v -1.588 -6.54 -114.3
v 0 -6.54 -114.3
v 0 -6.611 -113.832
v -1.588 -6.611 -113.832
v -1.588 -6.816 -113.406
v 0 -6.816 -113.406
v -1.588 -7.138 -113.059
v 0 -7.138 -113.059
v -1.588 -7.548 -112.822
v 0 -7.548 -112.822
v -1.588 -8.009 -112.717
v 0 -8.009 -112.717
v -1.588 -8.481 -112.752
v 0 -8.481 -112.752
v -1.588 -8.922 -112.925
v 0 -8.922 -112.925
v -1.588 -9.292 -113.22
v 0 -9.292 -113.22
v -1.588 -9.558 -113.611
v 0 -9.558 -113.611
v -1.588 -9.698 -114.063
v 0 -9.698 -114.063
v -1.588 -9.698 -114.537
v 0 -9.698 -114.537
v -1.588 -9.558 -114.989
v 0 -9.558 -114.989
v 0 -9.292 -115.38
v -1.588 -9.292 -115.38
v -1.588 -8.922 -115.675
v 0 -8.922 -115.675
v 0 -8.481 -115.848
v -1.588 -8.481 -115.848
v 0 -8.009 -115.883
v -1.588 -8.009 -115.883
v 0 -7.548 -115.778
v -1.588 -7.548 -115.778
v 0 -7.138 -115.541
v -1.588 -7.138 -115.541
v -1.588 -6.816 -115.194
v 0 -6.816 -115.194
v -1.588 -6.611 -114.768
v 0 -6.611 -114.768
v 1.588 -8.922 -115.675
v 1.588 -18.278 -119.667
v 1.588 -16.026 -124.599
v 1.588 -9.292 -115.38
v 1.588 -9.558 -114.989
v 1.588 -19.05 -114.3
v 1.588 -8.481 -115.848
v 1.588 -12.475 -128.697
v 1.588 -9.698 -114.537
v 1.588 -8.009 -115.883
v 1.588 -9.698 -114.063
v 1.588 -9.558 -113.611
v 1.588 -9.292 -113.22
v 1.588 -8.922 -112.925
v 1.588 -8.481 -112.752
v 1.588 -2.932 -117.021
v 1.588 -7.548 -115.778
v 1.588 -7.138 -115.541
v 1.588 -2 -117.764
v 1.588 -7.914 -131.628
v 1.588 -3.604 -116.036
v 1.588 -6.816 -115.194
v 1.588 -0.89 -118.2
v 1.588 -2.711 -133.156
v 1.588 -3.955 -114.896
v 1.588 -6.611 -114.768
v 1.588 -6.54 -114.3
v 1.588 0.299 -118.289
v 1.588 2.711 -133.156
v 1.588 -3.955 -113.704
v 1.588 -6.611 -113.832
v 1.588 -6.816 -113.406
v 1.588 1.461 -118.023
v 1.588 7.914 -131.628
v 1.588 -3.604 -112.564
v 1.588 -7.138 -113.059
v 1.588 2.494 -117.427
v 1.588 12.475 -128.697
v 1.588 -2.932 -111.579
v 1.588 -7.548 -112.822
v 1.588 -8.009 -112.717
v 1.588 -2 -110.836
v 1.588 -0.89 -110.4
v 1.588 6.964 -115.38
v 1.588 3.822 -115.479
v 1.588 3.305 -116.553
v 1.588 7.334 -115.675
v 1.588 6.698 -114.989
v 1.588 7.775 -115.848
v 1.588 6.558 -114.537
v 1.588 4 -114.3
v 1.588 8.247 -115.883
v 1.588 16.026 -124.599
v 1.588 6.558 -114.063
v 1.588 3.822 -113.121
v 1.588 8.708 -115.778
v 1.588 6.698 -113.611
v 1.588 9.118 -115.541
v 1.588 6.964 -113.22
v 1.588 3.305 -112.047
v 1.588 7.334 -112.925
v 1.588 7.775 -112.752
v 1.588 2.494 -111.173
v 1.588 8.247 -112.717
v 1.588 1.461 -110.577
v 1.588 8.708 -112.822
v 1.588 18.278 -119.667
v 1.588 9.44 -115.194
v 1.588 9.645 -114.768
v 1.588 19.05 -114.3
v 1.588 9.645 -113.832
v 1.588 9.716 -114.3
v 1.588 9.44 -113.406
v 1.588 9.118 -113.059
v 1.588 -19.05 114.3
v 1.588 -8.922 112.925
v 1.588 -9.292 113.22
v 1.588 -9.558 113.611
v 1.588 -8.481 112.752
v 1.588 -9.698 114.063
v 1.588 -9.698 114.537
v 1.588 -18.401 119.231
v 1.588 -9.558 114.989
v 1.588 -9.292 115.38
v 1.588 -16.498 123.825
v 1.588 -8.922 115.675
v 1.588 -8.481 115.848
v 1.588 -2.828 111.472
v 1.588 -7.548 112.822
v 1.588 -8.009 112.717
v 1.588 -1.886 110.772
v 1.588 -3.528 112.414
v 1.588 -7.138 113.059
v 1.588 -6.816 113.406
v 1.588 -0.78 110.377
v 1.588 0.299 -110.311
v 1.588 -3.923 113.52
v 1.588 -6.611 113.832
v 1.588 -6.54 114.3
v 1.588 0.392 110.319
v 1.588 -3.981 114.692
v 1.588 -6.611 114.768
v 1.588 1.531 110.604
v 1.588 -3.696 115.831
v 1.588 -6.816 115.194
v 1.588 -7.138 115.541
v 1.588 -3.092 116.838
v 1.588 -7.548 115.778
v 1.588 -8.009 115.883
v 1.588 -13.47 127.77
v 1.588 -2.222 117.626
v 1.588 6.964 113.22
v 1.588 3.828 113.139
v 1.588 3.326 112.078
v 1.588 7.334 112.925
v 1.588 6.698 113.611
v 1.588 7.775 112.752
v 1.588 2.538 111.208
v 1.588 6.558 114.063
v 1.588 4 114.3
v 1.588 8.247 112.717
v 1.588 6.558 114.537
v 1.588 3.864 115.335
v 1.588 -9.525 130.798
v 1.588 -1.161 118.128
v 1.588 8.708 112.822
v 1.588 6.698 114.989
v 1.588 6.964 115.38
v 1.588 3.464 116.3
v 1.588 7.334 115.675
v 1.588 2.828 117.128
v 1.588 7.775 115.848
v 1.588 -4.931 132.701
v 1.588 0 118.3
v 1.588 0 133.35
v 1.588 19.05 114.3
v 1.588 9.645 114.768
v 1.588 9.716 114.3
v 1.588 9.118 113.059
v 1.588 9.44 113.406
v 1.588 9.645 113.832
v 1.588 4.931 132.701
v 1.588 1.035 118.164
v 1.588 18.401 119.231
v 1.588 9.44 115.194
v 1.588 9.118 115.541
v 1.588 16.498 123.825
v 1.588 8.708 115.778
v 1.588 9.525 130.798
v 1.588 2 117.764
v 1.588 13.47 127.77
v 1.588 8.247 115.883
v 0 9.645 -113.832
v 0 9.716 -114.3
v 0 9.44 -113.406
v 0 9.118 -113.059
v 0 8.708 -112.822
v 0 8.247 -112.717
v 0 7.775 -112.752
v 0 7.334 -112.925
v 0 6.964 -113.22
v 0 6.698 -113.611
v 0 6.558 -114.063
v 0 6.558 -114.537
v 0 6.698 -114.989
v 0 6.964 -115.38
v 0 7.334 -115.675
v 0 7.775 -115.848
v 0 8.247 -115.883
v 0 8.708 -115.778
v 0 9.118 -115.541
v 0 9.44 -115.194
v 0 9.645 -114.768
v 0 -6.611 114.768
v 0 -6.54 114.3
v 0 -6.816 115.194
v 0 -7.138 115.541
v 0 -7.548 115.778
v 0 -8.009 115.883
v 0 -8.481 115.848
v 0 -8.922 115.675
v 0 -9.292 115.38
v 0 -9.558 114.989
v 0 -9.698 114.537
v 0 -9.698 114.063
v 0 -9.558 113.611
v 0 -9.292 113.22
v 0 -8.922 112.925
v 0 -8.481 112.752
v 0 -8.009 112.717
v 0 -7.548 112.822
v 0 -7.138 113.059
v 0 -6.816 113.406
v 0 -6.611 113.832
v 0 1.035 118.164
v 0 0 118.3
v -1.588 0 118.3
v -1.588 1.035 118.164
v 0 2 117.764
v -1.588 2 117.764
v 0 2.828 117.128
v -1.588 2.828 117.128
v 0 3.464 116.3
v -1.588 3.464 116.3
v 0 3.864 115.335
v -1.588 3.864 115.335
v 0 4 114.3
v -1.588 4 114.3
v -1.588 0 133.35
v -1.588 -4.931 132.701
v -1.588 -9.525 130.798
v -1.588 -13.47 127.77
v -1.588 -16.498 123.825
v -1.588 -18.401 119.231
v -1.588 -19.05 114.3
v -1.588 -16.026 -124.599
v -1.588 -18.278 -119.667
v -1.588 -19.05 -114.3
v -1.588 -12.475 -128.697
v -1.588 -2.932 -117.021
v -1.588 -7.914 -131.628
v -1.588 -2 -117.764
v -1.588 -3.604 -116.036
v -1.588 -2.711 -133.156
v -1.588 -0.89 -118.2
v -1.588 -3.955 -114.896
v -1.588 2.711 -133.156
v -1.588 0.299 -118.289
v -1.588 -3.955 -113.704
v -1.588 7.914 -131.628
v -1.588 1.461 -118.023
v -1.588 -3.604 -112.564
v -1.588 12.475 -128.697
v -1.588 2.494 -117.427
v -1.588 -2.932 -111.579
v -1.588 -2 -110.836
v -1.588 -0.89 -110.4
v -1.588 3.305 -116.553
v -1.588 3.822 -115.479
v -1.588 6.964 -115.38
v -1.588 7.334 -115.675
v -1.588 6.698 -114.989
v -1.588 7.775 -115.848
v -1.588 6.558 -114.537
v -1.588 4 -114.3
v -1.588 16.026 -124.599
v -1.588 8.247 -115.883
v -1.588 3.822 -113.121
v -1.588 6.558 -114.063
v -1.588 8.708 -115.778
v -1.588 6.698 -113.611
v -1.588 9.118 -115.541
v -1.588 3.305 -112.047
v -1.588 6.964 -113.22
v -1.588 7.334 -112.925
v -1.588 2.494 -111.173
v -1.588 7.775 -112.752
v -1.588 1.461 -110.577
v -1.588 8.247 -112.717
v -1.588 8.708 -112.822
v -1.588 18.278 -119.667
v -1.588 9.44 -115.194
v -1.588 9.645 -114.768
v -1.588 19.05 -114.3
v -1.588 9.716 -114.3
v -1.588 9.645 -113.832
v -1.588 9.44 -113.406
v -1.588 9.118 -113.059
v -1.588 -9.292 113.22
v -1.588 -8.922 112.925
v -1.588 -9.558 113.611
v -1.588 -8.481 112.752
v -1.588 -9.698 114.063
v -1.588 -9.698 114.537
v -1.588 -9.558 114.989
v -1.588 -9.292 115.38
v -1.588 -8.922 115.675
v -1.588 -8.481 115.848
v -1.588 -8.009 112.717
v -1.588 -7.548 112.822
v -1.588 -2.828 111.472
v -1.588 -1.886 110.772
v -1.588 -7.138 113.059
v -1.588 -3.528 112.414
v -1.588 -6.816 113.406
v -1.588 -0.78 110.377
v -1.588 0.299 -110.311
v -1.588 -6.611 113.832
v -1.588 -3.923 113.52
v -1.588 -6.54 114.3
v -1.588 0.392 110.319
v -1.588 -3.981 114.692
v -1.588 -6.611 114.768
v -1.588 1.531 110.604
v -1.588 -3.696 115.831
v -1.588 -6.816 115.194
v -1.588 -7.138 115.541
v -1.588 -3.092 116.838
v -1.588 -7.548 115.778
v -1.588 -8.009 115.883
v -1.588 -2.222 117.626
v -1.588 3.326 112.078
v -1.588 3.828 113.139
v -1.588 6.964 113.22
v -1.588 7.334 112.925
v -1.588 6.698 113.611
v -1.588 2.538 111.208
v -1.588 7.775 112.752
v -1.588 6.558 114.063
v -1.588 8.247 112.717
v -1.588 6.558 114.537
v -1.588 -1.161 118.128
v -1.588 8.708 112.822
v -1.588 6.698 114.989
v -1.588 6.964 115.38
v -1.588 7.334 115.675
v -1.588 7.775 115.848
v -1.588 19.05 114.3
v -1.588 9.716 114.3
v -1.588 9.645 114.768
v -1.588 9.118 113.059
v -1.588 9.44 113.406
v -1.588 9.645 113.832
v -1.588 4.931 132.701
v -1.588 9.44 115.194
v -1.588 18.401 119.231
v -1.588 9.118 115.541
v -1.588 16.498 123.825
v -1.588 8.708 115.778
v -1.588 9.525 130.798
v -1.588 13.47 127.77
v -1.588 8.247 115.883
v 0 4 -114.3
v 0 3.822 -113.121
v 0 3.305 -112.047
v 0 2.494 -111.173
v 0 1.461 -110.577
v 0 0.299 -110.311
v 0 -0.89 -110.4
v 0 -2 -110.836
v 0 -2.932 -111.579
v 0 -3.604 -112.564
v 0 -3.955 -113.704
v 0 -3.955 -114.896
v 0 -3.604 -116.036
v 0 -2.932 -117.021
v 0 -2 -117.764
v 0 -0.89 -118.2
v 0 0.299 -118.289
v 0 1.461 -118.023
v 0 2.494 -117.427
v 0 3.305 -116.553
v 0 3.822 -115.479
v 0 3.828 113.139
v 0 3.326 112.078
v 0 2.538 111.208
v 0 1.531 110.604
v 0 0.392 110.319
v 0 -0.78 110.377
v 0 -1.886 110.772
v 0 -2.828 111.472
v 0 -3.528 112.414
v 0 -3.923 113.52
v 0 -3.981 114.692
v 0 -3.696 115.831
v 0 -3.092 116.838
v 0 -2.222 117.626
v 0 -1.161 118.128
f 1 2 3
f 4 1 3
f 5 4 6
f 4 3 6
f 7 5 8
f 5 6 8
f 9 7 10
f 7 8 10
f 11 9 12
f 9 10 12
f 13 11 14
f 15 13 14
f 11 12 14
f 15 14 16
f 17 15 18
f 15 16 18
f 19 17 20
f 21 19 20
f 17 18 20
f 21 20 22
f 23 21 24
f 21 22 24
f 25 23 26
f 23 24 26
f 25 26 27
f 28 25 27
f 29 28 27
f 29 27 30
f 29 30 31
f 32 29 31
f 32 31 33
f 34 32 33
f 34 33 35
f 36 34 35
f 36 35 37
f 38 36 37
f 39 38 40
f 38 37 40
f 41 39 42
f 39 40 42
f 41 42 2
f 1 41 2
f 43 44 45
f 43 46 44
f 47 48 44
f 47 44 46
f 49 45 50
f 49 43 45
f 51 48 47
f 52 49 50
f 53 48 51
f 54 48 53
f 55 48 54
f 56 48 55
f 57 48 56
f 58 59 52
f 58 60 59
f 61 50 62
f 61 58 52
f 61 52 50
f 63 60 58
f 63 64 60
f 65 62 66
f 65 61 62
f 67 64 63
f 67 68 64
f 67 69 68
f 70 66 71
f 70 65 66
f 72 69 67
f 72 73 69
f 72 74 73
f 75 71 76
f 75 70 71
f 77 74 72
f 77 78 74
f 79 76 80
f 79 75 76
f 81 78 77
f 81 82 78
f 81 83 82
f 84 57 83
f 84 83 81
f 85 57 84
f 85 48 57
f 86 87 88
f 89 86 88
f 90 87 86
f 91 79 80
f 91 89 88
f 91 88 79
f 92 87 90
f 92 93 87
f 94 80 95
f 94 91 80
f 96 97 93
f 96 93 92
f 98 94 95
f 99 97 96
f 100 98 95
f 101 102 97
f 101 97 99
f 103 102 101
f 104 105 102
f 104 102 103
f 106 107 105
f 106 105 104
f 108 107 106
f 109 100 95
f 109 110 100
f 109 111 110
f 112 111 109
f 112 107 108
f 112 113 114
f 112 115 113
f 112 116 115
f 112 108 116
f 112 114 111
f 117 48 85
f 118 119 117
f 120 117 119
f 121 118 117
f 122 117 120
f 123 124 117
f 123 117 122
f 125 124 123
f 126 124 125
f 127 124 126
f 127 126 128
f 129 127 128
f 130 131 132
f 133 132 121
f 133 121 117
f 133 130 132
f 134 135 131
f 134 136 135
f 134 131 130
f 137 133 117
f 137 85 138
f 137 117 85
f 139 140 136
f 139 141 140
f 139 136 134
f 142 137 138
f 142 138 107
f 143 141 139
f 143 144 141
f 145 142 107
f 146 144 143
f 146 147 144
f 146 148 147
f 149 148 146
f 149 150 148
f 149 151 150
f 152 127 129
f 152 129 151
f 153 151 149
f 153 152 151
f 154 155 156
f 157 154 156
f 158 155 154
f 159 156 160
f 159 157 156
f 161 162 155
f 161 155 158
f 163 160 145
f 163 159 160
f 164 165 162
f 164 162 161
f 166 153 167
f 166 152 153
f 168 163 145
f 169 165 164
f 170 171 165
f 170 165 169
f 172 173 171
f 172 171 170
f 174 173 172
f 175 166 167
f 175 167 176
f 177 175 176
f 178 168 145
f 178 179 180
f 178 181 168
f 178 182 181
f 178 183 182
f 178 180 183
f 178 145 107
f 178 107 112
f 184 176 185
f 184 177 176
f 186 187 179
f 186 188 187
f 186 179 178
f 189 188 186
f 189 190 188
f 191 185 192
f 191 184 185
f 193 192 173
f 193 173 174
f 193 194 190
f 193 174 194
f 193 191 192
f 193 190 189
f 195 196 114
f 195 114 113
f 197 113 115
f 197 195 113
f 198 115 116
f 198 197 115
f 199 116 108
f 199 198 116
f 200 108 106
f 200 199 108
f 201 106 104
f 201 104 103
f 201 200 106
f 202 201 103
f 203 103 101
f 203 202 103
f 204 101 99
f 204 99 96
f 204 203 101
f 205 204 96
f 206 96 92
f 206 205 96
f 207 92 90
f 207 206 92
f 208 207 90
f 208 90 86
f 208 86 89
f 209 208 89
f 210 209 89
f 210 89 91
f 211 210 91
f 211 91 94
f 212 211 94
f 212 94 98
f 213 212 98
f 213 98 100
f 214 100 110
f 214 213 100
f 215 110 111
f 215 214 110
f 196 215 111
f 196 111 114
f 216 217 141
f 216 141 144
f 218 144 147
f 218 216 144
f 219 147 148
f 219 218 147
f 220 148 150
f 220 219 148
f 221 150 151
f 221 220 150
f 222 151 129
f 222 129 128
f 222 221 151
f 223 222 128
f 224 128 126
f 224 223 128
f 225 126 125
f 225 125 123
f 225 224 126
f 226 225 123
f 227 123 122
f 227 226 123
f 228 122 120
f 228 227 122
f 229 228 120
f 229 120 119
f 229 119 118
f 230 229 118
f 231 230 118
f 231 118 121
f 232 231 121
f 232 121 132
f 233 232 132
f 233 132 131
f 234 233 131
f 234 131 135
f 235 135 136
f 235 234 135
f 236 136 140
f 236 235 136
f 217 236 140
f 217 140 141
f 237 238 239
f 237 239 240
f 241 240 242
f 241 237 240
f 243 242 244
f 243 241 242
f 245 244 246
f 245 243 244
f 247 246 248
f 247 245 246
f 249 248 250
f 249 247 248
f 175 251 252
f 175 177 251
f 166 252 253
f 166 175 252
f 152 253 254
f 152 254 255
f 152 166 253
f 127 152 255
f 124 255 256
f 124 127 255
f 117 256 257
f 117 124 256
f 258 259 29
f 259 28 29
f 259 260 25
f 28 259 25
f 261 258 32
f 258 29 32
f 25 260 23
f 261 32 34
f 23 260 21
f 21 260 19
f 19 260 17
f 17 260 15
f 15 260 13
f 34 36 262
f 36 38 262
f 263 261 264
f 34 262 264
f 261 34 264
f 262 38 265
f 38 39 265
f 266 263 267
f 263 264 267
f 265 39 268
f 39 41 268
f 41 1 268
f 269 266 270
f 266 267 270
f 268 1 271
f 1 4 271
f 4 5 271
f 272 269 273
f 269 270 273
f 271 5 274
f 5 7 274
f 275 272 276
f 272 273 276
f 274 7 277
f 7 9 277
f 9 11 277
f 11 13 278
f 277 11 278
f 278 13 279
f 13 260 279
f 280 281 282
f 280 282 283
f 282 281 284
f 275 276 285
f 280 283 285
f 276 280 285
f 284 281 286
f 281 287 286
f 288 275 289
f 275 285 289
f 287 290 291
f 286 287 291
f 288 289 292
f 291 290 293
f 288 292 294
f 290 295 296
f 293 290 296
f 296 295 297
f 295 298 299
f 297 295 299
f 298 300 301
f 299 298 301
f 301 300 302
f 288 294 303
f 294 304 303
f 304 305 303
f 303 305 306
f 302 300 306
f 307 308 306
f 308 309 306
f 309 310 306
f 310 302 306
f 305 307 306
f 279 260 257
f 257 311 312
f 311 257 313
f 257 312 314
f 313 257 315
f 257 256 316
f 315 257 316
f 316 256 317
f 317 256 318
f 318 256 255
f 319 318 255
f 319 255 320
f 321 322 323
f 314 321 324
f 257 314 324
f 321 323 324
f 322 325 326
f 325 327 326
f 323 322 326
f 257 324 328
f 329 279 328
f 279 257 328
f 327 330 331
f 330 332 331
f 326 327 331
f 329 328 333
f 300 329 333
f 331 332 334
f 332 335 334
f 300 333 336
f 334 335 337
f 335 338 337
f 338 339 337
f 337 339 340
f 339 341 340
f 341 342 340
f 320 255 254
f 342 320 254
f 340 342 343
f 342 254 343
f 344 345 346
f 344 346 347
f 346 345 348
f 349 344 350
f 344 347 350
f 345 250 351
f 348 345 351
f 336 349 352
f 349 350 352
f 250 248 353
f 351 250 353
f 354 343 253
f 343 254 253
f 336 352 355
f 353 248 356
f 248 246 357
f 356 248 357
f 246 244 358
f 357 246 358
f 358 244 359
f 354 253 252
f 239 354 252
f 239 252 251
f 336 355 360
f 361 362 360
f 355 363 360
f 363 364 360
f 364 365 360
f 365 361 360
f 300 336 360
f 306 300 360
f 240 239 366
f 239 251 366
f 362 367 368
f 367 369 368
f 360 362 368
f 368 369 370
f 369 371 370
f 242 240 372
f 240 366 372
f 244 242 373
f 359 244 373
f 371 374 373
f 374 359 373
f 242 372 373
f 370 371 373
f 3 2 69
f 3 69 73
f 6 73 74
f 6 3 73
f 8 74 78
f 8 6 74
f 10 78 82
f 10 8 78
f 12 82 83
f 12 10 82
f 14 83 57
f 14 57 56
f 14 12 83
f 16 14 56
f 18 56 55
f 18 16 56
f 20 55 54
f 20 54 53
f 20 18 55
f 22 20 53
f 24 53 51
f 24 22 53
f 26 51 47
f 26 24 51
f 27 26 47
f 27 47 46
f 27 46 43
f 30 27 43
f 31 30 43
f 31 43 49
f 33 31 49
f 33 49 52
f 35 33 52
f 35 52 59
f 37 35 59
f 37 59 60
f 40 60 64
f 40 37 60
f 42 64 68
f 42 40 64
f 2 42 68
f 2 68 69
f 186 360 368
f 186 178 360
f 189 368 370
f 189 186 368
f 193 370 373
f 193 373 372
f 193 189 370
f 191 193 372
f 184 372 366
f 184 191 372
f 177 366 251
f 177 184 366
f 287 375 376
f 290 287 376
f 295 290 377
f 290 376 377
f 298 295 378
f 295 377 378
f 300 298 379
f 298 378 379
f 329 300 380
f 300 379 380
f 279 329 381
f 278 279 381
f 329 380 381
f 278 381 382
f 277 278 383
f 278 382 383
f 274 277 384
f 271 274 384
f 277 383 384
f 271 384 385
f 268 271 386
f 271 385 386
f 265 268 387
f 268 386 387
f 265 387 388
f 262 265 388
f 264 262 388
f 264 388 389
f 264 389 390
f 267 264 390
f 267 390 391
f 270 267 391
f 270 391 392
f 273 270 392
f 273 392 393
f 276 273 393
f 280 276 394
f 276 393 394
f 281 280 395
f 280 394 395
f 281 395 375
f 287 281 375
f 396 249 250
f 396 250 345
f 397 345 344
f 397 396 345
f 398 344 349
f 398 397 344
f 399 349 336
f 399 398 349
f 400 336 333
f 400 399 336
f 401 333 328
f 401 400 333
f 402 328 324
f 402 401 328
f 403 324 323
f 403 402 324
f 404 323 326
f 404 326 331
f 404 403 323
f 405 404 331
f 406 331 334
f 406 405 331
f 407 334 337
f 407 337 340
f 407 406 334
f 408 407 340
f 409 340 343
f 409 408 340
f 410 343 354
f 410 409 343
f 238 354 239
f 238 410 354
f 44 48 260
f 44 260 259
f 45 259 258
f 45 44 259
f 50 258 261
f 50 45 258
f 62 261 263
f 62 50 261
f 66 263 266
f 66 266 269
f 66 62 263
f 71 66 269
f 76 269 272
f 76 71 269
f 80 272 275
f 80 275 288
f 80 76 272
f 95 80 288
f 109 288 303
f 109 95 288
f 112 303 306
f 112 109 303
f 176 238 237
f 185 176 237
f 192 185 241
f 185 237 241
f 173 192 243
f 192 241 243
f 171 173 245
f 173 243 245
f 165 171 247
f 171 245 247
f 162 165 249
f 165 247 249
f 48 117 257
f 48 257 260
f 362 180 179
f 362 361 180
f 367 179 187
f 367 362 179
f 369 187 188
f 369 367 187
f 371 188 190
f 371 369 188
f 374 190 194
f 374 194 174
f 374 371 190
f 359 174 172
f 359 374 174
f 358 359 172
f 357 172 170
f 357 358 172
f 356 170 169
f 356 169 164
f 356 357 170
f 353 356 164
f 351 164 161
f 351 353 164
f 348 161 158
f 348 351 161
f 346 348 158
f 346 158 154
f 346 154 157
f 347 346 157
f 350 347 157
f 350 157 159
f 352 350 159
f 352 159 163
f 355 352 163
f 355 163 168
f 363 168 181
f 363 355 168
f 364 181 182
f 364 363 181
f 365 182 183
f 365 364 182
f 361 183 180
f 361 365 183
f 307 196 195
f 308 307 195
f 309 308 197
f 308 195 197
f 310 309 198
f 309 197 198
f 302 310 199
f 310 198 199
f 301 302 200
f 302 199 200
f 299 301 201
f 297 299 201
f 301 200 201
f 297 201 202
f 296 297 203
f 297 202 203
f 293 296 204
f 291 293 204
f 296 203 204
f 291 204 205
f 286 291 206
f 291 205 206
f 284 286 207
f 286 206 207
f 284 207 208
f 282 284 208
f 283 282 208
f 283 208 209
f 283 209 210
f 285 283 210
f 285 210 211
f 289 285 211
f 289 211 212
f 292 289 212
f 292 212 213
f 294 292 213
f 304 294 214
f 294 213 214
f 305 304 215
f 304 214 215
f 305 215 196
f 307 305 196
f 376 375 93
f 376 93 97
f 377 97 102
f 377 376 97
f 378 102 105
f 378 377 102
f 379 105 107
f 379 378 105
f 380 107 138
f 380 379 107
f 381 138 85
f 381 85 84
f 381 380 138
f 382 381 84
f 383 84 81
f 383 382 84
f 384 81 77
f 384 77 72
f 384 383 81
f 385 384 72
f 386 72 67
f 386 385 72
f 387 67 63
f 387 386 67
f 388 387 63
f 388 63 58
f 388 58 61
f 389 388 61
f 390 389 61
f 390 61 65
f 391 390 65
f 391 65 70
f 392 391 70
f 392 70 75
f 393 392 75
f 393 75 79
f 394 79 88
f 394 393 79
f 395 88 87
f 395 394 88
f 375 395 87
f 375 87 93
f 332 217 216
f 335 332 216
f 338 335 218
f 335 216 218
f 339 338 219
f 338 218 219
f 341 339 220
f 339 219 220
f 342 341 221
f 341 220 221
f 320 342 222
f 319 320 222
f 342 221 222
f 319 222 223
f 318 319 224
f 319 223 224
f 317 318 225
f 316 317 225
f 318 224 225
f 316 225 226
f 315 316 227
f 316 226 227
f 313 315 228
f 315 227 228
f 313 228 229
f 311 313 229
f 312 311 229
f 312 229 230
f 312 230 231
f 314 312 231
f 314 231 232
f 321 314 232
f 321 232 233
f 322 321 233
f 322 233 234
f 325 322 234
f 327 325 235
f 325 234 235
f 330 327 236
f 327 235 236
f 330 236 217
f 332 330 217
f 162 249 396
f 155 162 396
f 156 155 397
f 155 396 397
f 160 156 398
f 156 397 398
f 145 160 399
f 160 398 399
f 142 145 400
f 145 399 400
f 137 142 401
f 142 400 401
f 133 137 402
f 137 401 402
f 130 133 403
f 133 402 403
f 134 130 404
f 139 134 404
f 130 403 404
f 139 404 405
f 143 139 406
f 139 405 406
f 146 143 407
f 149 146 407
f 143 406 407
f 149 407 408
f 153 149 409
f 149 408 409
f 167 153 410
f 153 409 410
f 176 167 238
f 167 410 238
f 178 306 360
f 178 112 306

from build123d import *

# Parameters (mm, degrees)
F0_R     = 1.5875
F0_R_2   = 4.0000047
F1_DEPTH = 1.5875


with BuildPart() as f1:
    # F0 (on Right) → F1 (new body, symmetric)
    with BuildSketch(Plane.YZ):
        with BuildLine():
            ThreePointArc((0, 133.35), (-13.4703841816, 127.7703841816), (-19.05, 114.3))
            Line((-19.05, 114.3), (-19.05, -114.3))
            ThreePointArc((-19.05, -114.3), (0, -133.35), (19.05, -114.3))
            Line((19.05, -114.3), (19.05, 114.3))
            ThreePointArc((19.05, 114.3), (13.4703841816, 127.7703841816), (0, 133.35))
        make_face()
        with Locations((-8.128, -114.3)):
            Circle(F0_R, mode=Mode.SUBTRACT)
        with Locations((0, -114.3)):
            Circle(F0_R_2, mode=Mode.SUBTRACT)
        with Locations((8.128, -114.3)):
            Circle(F0_R, mode=Mode.SUBTRACT)
        with Locations((-8.128, 114.3)):
            Circle(F0_R, mode=Mode.SUBTRACT)
        with BuildLine():
            ThreePointArc((4.0000047, 114.3), (-2.8284304481, 111.4715695519), (0, 118.3000047))
            ThreePointArc((0, 118.3000047), (2.8284304481, 117.1284304481), (4.0000047, 114.3))
        make_face(mode=Mode.SUBTRACT)
        with Locations((8.128, 114.3)):
            Circle(F0_R, mode=Mode.SUBTRACT)
    extrude(amount=F1_DEPTH, both=True)


solid = f1.part
